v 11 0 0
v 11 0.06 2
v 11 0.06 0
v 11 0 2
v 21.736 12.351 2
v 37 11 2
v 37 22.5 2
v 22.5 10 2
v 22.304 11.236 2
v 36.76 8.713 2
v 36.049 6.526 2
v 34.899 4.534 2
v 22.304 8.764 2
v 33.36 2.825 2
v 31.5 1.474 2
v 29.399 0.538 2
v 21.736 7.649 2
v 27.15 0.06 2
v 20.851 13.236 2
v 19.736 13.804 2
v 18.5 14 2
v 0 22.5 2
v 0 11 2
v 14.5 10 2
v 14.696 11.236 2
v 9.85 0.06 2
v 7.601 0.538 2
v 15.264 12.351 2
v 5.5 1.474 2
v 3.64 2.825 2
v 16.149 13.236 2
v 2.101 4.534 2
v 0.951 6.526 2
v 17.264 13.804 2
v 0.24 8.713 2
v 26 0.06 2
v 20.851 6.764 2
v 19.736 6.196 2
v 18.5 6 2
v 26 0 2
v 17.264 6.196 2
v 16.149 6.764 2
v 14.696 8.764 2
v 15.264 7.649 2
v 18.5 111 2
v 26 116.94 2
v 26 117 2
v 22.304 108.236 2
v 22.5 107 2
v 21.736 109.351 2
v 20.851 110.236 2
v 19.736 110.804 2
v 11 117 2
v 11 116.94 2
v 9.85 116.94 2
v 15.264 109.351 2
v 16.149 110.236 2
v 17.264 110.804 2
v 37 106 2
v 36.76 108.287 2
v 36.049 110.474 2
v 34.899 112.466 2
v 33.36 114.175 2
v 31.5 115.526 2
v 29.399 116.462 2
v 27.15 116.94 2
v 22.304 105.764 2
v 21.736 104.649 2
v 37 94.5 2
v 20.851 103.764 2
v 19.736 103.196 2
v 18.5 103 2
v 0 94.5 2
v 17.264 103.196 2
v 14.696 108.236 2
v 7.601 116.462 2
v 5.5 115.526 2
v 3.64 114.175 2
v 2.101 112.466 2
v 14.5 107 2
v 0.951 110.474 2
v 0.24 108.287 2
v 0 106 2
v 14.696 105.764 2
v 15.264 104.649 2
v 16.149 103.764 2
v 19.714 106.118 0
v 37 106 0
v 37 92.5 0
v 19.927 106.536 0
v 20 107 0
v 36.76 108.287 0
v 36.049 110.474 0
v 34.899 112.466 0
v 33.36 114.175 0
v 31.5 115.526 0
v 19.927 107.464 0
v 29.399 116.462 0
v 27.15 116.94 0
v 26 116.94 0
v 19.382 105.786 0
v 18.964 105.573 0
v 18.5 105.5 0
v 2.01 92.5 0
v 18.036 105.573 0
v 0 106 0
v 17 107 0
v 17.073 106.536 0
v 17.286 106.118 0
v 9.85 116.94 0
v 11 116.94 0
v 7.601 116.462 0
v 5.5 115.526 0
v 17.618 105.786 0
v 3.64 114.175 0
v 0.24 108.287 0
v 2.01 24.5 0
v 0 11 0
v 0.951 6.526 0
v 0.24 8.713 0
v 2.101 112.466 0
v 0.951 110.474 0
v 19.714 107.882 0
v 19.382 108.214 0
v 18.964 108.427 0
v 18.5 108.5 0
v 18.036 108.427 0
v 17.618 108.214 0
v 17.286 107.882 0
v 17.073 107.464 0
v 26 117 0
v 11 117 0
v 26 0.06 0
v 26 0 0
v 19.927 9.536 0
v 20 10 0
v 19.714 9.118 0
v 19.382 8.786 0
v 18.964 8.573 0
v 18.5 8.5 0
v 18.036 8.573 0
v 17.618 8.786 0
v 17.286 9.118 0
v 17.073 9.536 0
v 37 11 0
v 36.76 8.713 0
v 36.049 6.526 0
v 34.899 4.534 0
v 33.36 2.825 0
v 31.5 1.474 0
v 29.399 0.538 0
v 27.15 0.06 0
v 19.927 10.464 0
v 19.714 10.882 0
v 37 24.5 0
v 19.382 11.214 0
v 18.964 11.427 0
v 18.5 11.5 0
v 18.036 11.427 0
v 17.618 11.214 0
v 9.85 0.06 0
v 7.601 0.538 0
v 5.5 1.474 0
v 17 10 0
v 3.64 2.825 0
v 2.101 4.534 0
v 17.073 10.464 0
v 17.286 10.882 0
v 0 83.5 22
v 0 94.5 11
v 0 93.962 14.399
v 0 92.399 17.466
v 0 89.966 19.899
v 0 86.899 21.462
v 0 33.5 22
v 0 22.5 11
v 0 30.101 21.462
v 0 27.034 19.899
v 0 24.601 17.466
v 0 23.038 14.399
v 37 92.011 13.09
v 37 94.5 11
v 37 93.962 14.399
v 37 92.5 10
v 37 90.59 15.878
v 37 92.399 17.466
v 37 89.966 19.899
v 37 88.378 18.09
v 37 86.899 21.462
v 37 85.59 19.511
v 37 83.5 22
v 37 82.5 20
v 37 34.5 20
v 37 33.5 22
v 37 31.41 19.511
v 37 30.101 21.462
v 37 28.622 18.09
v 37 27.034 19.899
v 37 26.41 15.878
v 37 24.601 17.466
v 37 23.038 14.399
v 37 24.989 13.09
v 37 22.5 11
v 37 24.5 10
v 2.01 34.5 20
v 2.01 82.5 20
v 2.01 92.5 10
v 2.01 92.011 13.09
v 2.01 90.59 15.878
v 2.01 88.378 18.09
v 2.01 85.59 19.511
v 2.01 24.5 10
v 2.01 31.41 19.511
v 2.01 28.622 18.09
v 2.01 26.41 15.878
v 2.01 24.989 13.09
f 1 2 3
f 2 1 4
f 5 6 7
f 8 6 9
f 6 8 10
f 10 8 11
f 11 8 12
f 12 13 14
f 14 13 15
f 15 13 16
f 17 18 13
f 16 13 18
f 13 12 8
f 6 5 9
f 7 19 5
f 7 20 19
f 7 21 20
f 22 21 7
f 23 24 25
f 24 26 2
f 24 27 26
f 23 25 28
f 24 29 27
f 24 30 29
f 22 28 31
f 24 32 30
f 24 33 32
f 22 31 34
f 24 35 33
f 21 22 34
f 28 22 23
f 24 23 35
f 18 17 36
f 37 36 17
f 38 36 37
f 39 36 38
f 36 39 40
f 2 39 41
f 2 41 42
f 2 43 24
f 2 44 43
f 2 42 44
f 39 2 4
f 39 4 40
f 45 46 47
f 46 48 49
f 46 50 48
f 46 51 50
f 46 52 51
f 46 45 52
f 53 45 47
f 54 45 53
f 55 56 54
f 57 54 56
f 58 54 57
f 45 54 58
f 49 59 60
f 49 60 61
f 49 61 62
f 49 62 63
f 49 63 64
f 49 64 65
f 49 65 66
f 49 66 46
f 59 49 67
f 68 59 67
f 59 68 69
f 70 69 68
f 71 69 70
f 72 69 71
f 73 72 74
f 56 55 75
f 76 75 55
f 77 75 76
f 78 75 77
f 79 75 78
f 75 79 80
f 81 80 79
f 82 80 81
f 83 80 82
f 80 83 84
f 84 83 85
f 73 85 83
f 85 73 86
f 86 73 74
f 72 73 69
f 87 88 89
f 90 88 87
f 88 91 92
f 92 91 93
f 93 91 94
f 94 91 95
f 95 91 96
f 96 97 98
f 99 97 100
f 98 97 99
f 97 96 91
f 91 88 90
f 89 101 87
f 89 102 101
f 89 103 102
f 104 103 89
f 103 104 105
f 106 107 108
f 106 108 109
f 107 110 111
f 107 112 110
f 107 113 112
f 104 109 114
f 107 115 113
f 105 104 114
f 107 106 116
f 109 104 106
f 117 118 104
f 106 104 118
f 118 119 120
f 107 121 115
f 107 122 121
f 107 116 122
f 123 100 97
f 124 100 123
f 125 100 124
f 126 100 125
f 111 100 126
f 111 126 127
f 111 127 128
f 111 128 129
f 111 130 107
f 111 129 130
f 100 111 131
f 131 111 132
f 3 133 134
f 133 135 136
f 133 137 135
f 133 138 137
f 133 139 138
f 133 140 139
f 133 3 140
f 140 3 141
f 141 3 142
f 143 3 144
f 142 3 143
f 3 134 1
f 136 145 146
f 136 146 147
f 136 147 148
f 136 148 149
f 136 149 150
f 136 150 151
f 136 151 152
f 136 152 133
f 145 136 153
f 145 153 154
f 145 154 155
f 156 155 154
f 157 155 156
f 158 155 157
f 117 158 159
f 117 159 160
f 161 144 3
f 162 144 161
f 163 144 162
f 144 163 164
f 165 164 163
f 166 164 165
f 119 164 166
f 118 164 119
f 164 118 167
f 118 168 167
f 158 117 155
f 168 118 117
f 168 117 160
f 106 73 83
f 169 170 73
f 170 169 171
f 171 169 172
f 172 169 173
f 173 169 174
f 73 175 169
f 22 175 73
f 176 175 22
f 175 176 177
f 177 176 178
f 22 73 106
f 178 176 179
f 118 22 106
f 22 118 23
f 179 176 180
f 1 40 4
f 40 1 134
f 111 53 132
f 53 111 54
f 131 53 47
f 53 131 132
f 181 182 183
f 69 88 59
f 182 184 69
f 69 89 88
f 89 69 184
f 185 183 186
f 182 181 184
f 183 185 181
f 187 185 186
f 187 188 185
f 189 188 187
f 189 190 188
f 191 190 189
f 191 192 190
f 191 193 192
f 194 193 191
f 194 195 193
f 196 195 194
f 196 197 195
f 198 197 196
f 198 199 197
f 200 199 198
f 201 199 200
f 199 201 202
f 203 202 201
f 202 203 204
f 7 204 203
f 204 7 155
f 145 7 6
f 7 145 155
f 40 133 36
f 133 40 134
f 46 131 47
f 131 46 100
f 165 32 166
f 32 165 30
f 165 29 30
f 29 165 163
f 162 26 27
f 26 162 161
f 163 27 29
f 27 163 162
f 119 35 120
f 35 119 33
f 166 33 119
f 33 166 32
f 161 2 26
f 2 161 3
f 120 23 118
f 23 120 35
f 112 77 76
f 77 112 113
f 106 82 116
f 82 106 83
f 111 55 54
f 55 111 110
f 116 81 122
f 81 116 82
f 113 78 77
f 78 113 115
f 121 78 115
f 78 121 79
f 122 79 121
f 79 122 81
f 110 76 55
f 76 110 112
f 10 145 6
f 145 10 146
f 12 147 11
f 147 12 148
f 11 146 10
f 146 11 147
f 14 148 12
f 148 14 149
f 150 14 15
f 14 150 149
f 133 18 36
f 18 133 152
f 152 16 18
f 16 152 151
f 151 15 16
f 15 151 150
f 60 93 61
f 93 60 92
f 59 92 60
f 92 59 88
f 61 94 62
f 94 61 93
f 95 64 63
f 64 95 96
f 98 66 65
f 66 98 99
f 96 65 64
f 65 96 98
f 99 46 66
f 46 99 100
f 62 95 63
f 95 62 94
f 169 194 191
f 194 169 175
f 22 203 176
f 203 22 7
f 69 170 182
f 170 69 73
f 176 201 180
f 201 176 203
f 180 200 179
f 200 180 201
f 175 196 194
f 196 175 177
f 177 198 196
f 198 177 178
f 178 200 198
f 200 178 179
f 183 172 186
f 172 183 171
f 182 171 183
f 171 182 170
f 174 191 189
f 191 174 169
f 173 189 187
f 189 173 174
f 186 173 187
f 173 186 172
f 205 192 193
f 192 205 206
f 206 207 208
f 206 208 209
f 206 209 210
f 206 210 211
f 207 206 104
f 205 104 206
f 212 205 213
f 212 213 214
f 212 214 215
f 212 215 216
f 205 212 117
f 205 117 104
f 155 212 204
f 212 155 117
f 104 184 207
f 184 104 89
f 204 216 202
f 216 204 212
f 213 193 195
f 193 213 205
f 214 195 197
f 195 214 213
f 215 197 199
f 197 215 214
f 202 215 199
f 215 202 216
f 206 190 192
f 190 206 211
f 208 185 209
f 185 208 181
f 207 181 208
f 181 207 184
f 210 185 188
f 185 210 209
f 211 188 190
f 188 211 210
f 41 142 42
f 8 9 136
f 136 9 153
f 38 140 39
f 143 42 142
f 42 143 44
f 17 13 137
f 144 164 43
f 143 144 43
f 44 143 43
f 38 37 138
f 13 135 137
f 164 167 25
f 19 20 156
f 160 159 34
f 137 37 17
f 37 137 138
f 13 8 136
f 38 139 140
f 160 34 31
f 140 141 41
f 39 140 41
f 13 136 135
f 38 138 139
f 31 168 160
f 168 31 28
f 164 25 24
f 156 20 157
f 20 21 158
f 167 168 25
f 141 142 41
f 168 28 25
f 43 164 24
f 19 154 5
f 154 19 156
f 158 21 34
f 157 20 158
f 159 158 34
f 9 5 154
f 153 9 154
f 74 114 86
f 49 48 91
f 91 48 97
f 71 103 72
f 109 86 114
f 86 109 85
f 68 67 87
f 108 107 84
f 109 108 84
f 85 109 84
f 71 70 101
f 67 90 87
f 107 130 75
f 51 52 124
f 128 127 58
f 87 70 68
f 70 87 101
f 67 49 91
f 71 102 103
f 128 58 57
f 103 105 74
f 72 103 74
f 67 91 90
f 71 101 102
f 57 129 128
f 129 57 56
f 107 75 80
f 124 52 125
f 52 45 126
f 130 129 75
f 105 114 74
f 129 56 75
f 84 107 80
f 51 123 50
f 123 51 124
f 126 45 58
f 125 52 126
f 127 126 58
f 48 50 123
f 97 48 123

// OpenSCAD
// flat wall switch cover
// John Ridley
// December 1 2012

screw_spacing = 97;
inside_height = 20;
inside_width = 35;
inside_length = 68;
wall_thickness = 2;

// Y and X spacing beyond screw (for Y) or outside width (for x)
length_perimeter = 10;
width_perimeter = 0;

screw_dia = 3;
head_dia  = 8;
head_ht = 2;

outside_height = inside_height + wall_thickness;
outside_width = inside_width + wall_thickness;
outside_length = inside_length + wall_thickness * 2;

radius = 11;


	difference()
	{
		union()
		{
			base();
			translate([width_perimeter, 
				(screw_spacing+length_perimeter*2-outside_length)/2, 0])
				round_top_box(width=outside_width,length=outside_length, height=outside_height, rradius = radius);
		}
		translate([width_perimeter+wall_thickness + 0.01, 
				(screw_spacing+length_perimeter*2-outside_length)/2+wall_thickness, 0])
			round_top_box(width=inside_width,length=inside_length,height=inside_height, rradius = radius - wall_thickness/2);

		for (y=[0:1])
			translate([(outside_width+width_perimeter*2)/2,length_perimeter+y*screw_spacing,0])
				screwhole(rad1 = screw_dia/2, rad2 = head_dia/2, ht=wall_thickness, hd_ht = head_ht);
	}

module screwhole(rad1, rad2, ht, hd_ht)
{
	cylinder(r=rad1, h=ht);
	translate([0,0,ht-head_ht])
		cylinder(r1=rad1, r2=rad2, h=hd_ht, $fn=20);
}

module base()
{
	difference()
	{
		cube([outside_width + width_perimeter*2, screw_spacing + length_perimeter*2, wall_thickness]);
		for (x=[0:1])
			for (y=[0:1])
			{
				translate([x*(outside_width+width_perimeter*2 - radius),y*(screw_spacing + length_perimeter*2 - radius),0])
					cube([radius, radius, wall_thickness]);
			}
	}
	for (x=[0:1])
		for (y=[0:1])
		{
			translate([x*(outside_width+width_perimeter*2 - radius*2)+radius,y*(screw_spacing + length_perimeter*2 - radius*2)+radius,0])
			cylinder(r=radius, h=wall_thickness);
		}
}


module round_top_box(width, length, height, rradius)
{
	difference()
	{
		cube([width, length, height]);
		for (y=[0,1])
			translate([0,(length-rradius)*y, height-rradius])
				cube([width, rradius, rradius]);
	}
	for (y=[0,1])
		translate([0,(length-rradius*2)*y+rradius, height-rradius])
			rotate([0,90,0])
				cylinder(r=rradius, h=width,$fn=20);
}
